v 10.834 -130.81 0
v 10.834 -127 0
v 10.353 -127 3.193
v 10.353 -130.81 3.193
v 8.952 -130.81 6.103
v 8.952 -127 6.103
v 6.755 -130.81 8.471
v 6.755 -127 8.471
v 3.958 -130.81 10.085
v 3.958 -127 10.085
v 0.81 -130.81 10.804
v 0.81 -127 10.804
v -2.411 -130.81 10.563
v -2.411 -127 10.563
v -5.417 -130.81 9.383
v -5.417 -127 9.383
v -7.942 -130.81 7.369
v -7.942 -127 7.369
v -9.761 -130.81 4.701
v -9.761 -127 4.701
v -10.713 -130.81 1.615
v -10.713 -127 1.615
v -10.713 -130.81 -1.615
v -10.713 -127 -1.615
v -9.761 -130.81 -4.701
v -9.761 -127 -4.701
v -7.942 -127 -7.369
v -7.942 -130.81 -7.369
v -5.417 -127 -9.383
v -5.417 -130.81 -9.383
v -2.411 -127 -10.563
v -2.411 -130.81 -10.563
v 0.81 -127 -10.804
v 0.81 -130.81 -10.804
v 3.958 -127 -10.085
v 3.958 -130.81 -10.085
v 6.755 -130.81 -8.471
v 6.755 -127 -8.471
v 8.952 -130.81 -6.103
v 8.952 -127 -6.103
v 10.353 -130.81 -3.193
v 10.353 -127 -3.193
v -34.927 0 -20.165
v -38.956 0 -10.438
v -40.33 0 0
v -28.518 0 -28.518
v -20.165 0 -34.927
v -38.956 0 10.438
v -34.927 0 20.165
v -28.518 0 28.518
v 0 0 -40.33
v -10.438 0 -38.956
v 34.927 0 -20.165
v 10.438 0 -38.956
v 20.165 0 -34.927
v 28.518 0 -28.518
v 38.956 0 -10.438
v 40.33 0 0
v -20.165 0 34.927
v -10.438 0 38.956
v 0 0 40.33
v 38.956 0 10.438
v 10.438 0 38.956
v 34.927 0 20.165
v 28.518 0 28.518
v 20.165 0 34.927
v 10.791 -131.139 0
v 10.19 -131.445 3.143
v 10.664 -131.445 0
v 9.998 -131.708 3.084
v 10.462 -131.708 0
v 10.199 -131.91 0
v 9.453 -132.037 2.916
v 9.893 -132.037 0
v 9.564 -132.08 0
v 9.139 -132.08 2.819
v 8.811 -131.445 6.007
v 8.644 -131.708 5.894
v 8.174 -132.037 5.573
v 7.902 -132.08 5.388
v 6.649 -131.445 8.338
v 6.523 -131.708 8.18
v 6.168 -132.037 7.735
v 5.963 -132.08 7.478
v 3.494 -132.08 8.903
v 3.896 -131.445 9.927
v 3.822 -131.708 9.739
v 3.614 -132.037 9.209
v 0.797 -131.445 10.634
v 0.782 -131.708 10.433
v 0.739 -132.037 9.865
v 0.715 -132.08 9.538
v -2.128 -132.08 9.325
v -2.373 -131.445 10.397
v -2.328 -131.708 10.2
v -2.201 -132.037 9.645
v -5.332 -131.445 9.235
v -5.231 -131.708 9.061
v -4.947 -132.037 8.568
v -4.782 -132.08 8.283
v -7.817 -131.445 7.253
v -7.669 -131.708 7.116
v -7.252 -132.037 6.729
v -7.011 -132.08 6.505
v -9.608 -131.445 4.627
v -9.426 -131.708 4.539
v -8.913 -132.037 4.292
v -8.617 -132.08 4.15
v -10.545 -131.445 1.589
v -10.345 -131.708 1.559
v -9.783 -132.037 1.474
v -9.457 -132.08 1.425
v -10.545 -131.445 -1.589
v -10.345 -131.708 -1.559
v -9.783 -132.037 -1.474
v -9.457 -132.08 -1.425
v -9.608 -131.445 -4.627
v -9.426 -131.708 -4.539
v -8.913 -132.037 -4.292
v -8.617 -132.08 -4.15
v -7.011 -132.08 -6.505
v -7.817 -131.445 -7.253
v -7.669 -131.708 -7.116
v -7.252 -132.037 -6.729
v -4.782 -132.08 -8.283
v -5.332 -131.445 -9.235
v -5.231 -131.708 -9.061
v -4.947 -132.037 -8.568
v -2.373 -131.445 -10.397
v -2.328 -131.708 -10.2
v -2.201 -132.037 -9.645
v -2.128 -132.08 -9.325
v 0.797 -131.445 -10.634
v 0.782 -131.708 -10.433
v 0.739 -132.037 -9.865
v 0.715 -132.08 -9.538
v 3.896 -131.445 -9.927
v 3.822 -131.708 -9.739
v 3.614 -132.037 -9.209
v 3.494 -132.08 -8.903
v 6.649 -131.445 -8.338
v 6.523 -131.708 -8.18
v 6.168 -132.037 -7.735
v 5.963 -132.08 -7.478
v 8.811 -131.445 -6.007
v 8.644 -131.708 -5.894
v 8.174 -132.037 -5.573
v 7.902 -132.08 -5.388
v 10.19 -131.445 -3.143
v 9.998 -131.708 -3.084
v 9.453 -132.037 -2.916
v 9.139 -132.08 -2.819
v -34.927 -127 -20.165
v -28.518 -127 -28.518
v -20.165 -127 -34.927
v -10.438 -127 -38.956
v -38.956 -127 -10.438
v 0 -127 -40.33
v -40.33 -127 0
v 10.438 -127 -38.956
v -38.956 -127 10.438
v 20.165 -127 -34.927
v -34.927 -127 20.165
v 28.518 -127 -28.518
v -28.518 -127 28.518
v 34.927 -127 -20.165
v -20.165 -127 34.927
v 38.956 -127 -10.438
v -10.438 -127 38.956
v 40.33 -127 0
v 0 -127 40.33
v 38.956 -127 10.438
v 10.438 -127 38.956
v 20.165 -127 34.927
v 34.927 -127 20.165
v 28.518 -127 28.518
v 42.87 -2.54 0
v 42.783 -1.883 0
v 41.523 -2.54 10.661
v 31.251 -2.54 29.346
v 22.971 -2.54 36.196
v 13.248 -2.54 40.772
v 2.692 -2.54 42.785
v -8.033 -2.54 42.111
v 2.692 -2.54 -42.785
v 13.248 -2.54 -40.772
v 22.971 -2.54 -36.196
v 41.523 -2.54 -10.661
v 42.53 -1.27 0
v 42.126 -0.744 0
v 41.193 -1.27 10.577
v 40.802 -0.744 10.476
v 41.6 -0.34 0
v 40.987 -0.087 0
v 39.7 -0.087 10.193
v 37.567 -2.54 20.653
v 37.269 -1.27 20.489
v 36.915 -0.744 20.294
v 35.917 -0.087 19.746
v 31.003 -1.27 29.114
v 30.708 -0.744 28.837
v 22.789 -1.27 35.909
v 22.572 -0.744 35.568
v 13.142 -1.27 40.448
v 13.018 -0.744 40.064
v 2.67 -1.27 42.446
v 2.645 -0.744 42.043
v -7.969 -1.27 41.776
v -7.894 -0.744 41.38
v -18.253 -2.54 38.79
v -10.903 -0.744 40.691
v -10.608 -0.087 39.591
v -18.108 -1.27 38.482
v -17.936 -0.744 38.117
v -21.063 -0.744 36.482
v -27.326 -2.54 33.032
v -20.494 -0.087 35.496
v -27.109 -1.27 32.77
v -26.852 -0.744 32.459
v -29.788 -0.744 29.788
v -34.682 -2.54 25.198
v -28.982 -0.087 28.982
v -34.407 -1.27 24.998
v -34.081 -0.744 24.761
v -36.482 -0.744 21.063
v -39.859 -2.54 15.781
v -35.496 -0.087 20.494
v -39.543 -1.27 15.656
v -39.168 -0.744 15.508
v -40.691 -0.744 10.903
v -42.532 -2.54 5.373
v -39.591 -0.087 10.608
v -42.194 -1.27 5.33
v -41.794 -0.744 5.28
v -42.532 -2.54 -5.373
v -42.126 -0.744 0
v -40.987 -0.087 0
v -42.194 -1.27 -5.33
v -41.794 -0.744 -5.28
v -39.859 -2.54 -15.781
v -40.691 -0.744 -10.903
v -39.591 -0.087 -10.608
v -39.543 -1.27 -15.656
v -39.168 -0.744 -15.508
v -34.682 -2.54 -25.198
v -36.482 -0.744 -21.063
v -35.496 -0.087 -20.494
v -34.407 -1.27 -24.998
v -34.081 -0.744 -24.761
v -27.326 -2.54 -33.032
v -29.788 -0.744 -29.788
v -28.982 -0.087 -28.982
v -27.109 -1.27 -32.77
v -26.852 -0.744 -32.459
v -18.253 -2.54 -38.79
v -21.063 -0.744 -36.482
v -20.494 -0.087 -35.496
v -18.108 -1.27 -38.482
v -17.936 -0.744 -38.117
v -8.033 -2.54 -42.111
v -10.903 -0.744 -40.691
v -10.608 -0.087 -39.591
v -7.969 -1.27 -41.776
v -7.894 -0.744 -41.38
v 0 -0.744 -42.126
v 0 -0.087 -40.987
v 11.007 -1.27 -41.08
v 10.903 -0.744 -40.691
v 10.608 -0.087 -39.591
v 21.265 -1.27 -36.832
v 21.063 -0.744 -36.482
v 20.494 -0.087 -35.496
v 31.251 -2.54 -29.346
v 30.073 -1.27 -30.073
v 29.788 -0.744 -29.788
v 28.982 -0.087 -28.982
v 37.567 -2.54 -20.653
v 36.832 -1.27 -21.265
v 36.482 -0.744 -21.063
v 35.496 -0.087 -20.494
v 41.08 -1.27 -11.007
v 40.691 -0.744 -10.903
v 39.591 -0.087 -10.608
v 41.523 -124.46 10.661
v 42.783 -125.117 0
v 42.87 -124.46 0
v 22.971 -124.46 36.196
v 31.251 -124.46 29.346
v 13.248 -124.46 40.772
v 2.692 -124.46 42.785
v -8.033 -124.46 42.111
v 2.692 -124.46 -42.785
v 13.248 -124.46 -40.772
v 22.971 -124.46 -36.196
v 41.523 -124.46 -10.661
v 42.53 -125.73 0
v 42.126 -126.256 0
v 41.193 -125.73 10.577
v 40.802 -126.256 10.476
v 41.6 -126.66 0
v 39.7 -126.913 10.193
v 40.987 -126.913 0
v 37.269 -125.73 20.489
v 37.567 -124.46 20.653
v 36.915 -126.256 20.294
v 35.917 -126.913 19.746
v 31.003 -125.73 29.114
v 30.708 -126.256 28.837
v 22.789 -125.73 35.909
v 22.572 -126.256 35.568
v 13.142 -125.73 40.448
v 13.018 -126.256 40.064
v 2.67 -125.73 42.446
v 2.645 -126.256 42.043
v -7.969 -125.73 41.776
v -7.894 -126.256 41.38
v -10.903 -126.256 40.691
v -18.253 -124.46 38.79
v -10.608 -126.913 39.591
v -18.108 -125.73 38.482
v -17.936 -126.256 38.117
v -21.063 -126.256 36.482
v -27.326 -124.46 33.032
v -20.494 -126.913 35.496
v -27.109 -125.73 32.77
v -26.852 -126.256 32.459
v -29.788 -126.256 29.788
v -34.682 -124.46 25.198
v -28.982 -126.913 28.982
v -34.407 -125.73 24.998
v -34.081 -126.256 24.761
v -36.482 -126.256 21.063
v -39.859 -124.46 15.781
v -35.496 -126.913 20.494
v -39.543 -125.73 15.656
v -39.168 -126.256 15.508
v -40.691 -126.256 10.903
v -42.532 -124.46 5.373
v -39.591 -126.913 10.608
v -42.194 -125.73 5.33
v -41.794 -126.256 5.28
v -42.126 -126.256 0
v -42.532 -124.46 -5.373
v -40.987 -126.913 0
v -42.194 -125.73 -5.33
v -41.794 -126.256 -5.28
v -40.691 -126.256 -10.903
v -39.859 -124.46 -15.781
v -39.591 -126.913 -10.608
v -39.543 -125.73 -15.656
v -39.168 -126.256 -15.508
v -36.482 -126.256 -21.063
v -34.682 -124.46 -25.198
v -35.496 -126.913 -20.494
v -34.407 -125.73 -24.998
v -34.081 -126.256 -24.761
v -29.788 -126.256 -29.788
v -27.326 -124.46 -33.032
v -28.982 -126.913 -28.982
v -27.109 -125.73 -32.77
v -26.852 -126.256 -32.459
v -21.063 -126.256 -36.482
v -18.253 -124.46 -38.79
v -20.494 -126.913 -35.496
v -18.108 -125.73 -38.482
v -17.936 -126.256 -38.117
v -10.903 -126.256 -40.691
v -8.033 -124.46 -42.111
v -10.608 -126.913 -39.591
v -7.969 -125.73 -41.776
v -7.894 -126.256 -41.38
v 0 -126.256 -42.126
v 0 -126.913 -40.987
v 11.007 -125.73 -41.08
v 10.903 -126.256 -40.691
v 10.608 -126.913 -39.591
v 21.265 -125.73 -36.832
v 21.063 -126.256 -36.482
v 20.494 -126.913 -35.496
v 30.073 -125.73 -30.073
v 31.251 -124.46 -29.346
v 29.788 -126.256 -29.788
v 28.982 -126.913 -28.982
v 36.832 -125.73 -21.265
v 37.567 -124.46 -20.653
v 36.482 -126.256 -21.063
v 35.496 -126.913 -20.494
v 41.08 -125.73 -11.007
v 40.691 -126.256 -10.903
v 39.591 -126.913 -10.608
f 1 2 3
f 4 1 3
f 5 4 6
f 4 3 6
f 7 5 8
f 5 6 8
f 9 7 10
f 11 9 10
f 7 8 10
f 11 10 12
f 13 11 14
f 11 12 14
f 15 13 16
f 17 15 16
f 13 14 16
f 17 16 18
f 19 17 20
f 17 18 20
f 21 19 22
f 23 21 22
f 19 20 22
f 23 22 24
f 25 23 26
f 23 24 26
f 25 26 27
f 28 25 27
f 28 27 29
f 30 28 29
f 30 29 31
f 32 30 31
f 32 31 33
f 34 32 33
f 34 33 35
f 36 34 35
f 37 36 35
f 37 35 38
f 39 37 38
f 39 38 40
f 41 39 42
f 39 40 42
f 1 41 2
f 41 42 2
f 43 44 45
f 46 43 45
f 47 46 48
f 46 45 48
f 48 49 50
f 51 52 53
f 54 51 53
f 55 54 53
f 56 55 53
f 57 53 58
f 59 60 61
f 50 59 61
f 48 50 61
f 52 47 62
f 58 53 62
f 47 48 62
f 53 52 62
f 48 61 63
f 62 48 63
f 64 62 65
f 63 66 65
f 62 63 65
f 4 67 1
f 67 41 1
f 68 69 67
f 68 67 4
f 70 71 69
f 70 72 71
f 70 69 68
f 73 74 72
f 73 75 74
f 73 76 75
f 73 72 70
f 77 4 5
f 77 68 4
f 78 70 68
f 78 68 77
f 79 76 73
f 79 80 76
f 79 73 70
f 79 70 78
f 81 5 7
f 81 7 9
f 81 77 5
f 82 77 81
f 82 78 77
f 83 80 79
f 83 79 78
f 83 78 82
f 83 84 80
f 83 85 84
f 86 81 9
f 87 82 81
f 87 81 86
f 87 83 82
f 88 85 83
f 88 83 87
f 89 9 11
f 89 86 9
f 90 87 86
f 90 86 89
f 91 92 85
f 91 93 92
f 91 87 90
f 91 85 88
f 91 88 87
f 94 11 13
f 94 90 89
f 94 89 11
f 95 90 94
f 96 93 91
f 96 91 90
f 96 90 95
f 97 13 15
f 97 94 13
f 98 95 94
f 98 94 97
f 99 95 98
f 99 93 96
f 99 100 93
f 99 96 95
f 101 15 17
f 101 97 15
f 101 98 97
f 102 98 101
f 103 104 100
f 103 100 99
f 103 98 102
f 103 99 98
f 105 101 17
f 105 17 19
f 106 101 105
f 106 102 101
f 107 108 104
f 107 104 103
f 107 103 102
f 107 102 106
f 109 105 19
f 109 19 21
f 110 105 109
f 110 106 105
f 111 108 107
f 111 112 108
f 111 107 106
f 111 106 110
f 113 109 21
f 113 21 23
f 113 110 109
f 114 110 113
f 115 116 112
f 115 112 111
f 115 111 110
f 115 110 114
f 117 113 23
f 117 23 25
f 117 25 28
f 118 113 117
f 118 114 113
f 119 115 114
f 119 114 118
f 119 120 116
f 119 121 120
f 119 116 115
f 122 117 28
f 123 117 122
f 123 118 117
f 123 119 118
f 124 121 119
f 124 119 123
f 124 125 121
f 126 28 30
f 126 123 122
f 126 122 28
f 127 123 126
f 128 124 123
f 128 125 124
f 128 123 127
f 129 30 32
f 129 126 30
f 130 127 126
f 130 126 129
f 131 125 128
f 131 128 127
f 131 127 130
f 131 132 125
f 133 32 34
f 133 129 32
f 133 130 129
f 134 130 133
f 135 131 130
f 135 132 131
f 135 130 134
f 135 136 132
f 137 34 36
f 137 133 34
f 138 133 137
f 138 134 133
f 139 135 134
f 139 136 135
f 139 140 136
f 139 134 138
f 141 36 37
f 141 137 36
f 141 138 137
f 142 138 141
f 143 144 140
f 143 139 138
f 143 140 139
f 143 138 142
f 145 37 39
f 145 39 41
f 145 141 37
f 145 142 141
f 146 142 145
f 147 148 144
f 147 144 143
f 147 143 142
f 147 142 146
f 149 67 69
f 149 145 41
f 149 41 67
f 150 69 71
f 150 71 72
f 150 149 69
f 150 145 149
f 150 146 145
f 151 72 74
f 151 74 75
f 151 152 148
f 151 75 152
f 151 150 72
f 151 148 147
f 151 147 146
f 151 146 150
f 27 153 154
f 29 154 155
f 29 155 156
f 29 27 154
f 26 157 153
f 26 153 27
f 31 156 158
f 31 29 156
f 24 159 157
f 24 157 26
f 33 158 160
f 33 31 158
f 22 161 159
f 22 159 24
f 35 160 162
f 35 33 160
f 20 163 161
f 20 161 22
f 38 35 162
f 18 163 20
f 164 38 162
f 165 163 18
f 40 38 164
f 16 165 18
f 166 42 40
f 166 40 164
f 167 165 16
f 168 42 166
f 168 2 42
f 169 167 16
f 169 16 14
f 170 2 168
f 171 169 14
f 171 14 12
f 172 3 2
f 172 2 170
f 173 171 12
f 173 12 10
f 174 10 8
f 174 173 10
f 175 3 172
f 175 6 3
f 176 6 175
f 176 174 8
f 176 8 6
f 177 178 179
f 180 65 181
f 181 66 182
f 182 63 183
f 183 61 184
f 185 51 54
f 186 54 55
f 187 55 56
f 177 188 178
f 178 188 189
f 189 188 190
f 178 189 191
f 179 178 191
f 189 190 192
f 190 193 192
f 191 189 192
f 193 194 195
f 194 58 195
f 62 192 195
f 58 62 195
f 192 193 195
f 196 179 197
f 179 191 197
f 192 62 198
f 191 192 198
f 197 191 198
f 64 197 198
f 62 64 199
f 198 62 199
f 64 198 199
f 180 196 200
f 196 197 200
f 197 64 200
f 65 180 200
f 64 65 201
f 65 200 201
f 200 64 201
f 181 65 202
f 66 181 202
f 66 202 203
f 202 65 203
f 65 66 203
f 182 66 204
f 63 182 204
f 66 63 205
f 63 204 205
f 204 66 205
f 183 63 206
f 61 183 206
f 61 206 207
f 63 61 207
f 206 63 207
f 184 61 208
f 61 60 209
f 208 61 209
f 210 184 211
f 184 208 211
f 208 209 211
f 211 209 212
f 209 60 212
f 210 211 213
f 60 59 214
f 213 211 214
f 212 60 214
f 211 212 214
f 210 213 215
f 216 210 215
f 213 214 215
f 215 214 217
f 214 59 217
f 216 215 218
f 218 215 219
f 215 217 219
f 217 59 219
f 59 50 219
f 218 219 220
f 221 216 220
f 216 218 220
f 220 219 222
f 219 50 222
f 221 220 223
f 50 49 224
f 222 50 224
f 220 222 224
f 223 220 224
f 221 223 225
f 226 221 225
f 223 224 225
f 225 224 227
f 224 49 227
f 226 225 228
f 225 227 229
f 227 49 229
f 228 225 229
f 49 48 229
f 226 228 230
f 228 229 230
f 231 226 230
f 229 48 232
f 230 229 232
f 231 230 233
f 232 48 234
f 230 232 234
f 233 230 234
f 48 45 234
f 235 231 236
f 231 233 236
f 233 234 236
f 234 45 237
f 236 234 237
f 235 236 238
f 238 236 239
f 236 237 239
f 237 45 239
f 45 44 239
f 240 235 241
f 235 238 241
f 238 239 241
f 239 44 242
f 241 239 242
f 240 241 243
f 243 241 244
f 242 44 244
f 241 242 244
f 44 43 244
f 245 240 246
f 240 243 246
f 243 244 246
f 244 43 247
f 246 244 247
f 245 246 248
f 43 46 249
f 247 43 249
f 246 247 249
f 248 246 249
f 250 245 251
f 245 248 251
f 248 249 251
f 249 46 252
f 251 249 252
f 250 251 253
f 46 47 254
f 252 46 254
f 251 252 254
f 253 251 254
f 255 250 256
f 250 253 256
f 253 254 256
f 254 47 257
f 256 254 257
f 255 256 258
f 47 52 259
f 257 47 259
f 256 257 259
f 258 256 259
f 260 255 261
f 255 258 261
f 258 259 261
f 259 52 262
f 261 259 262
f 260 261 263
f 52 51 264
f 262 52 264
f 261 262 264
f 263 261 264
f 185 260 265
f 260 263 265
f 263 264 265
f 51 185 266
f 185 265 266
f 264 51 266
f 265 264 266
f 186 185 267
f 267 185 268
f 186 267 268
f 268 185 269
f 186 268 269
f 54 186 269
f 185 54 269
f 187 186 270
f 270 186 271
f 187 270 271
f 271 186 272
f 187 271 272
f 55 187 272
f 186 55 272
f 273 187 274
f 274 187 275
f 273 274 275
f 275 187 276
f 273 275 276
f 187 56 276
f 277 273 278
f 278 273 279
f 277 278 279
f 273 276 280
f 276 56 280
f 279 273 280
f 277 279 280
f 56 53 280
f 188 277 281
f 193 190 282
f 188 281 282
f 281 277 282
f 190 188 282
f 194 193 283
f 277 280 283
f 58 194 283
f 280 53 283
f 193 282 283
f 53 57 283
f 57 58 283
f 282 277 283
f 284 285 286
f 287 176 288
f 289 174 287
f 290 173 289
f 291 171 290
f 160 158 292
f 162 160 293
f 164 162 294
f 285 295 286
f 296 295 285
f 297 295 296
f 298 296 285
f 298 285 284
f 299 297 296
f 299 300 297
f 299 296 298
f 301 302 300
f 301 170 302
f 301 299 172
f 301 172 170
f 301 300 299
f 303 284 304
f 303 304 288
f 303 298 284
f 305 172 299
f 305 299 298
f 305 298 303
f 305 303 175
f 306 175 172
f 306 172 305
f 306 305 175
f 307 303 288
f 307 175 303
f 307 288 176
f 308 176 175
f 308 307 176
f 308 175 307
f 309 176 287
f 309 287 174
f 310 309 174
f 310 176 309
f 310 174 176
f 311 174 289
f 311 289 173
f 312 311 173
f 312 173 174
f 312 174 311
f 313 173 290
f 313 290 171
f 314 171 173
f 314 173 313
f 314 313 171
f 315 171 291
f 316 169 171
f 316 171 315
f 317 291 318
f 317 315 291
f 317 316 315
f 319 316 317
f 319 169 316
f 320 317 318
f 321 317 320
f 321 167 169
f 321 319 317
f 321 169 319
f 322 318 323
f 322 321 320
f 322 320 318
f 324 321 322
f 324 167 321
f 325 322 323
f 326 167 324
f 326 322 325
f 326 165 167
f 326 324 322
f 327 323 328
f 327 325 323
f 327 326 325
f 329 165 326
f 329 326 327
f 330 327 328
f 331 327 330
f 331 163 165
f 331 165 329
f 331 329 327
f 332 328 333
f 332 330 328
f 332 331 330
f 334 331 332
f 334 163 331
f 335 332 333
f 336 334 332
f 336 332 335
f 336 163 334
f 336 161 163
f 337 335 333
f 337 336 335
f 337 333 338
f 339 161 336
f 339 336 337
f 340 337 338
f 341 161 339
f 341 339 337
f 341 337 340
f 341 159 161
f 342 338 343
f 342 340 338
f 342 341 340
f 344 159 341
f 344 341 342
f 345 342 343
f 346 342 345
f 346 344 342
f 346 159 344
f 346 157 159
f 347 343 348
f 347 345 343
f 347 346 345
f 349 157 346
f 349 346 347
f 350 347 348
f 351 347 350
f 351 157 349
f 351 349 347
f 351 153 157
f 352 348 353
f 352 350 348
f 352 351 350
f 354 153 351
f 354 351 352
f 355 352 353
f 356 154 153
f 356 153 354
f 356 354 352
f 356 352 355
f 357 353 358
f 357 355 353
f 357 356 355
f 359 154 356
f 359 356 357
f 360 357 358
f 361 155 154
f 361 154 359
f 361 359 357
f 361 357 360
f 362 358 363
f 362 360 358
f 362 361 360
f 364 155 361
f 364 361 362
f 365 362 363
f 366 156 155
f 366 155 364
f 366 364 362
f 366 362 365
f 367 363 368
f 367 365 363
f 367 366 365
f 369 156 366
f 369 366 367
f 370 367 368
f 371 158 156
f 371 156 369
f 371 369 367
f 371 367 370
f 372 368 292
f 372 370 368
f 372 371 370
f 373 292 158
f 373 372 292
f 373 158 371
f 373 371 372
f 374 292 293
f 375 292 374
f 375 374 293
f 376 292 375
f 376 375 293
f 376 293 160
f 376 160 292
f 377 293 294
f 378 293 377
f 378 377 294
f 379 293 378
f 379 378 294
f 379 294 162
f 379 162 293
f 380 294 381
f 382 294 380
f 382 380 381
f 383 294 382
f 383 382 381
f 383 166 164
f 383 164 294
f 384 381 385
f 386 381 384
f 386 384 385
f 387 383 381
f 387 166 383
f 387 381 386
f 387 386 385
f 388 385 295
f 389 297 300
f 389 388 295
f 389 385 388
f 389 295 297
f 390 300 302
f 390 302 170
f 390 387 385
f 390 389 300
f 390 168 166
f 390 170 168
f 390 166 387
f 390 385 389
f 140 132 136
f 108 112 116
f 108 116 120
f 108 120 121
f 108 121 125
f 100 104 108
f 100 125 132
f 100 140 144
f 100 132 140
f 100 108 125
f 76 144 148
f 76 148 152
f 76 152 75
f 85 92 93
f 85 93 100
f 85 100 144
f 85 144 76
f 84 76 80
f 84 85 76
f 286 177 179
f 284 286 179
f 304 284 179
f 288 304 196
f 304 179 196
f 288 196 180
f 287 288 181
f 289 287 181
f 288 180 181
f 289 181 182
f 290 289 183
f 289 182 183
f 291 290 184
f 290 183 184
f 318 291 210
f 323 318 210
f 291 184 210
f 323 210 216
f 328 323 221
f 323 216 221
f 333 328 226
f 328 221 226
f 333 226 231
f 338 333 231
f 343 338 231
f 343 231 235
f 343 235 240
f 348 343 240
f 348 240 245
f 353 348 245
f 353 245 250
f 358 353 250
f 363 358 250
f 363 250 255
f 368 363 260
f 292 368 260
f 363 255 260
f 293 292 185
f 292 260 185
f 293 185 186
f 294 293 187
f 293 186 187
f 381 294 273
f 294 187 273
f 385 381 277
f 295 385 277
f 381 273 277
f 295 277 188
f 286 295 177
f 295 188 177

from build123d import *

# Parameters (mm, degrees)
F0_R     = 42.869903
F1_DEPTH = 127
F2_R     = 2.54
F3_R     = 10.834308
F4_DEPTH = 5.08
F5_R     = 1.27


with BuildPart() as f1:
    # F0 (on Front) → F1 (new body)
    with BuildSketch(Plane.XZ):
        Circle(F0_R)
    extrude(amount=F1_DEPTH)

    # F2
    f2_edges = [f1.edges().sort_by_distance(p)[0] for p in [
        (42.869903, -63.5, 0),
        (-42.869903, 0, 0),
        (-42.869903, -127, 0),
    ]]
    fillet(f2_edges, radius=F2_R)

    # F3 (on face) → F4 (join)
    with BuildSketch(Plane.XZ.offset(127)):
        Circle(F3_R)
    extrude(amount=F4_DEPTH)

    # F5
    f5_edges = [f1.edges().sort_by_distance(p)[0] for p in [
        (-10.834308, -132.08, 0),
    ]]
    fillet(f5_edges, radius=F5_R)


solid = f1.part
